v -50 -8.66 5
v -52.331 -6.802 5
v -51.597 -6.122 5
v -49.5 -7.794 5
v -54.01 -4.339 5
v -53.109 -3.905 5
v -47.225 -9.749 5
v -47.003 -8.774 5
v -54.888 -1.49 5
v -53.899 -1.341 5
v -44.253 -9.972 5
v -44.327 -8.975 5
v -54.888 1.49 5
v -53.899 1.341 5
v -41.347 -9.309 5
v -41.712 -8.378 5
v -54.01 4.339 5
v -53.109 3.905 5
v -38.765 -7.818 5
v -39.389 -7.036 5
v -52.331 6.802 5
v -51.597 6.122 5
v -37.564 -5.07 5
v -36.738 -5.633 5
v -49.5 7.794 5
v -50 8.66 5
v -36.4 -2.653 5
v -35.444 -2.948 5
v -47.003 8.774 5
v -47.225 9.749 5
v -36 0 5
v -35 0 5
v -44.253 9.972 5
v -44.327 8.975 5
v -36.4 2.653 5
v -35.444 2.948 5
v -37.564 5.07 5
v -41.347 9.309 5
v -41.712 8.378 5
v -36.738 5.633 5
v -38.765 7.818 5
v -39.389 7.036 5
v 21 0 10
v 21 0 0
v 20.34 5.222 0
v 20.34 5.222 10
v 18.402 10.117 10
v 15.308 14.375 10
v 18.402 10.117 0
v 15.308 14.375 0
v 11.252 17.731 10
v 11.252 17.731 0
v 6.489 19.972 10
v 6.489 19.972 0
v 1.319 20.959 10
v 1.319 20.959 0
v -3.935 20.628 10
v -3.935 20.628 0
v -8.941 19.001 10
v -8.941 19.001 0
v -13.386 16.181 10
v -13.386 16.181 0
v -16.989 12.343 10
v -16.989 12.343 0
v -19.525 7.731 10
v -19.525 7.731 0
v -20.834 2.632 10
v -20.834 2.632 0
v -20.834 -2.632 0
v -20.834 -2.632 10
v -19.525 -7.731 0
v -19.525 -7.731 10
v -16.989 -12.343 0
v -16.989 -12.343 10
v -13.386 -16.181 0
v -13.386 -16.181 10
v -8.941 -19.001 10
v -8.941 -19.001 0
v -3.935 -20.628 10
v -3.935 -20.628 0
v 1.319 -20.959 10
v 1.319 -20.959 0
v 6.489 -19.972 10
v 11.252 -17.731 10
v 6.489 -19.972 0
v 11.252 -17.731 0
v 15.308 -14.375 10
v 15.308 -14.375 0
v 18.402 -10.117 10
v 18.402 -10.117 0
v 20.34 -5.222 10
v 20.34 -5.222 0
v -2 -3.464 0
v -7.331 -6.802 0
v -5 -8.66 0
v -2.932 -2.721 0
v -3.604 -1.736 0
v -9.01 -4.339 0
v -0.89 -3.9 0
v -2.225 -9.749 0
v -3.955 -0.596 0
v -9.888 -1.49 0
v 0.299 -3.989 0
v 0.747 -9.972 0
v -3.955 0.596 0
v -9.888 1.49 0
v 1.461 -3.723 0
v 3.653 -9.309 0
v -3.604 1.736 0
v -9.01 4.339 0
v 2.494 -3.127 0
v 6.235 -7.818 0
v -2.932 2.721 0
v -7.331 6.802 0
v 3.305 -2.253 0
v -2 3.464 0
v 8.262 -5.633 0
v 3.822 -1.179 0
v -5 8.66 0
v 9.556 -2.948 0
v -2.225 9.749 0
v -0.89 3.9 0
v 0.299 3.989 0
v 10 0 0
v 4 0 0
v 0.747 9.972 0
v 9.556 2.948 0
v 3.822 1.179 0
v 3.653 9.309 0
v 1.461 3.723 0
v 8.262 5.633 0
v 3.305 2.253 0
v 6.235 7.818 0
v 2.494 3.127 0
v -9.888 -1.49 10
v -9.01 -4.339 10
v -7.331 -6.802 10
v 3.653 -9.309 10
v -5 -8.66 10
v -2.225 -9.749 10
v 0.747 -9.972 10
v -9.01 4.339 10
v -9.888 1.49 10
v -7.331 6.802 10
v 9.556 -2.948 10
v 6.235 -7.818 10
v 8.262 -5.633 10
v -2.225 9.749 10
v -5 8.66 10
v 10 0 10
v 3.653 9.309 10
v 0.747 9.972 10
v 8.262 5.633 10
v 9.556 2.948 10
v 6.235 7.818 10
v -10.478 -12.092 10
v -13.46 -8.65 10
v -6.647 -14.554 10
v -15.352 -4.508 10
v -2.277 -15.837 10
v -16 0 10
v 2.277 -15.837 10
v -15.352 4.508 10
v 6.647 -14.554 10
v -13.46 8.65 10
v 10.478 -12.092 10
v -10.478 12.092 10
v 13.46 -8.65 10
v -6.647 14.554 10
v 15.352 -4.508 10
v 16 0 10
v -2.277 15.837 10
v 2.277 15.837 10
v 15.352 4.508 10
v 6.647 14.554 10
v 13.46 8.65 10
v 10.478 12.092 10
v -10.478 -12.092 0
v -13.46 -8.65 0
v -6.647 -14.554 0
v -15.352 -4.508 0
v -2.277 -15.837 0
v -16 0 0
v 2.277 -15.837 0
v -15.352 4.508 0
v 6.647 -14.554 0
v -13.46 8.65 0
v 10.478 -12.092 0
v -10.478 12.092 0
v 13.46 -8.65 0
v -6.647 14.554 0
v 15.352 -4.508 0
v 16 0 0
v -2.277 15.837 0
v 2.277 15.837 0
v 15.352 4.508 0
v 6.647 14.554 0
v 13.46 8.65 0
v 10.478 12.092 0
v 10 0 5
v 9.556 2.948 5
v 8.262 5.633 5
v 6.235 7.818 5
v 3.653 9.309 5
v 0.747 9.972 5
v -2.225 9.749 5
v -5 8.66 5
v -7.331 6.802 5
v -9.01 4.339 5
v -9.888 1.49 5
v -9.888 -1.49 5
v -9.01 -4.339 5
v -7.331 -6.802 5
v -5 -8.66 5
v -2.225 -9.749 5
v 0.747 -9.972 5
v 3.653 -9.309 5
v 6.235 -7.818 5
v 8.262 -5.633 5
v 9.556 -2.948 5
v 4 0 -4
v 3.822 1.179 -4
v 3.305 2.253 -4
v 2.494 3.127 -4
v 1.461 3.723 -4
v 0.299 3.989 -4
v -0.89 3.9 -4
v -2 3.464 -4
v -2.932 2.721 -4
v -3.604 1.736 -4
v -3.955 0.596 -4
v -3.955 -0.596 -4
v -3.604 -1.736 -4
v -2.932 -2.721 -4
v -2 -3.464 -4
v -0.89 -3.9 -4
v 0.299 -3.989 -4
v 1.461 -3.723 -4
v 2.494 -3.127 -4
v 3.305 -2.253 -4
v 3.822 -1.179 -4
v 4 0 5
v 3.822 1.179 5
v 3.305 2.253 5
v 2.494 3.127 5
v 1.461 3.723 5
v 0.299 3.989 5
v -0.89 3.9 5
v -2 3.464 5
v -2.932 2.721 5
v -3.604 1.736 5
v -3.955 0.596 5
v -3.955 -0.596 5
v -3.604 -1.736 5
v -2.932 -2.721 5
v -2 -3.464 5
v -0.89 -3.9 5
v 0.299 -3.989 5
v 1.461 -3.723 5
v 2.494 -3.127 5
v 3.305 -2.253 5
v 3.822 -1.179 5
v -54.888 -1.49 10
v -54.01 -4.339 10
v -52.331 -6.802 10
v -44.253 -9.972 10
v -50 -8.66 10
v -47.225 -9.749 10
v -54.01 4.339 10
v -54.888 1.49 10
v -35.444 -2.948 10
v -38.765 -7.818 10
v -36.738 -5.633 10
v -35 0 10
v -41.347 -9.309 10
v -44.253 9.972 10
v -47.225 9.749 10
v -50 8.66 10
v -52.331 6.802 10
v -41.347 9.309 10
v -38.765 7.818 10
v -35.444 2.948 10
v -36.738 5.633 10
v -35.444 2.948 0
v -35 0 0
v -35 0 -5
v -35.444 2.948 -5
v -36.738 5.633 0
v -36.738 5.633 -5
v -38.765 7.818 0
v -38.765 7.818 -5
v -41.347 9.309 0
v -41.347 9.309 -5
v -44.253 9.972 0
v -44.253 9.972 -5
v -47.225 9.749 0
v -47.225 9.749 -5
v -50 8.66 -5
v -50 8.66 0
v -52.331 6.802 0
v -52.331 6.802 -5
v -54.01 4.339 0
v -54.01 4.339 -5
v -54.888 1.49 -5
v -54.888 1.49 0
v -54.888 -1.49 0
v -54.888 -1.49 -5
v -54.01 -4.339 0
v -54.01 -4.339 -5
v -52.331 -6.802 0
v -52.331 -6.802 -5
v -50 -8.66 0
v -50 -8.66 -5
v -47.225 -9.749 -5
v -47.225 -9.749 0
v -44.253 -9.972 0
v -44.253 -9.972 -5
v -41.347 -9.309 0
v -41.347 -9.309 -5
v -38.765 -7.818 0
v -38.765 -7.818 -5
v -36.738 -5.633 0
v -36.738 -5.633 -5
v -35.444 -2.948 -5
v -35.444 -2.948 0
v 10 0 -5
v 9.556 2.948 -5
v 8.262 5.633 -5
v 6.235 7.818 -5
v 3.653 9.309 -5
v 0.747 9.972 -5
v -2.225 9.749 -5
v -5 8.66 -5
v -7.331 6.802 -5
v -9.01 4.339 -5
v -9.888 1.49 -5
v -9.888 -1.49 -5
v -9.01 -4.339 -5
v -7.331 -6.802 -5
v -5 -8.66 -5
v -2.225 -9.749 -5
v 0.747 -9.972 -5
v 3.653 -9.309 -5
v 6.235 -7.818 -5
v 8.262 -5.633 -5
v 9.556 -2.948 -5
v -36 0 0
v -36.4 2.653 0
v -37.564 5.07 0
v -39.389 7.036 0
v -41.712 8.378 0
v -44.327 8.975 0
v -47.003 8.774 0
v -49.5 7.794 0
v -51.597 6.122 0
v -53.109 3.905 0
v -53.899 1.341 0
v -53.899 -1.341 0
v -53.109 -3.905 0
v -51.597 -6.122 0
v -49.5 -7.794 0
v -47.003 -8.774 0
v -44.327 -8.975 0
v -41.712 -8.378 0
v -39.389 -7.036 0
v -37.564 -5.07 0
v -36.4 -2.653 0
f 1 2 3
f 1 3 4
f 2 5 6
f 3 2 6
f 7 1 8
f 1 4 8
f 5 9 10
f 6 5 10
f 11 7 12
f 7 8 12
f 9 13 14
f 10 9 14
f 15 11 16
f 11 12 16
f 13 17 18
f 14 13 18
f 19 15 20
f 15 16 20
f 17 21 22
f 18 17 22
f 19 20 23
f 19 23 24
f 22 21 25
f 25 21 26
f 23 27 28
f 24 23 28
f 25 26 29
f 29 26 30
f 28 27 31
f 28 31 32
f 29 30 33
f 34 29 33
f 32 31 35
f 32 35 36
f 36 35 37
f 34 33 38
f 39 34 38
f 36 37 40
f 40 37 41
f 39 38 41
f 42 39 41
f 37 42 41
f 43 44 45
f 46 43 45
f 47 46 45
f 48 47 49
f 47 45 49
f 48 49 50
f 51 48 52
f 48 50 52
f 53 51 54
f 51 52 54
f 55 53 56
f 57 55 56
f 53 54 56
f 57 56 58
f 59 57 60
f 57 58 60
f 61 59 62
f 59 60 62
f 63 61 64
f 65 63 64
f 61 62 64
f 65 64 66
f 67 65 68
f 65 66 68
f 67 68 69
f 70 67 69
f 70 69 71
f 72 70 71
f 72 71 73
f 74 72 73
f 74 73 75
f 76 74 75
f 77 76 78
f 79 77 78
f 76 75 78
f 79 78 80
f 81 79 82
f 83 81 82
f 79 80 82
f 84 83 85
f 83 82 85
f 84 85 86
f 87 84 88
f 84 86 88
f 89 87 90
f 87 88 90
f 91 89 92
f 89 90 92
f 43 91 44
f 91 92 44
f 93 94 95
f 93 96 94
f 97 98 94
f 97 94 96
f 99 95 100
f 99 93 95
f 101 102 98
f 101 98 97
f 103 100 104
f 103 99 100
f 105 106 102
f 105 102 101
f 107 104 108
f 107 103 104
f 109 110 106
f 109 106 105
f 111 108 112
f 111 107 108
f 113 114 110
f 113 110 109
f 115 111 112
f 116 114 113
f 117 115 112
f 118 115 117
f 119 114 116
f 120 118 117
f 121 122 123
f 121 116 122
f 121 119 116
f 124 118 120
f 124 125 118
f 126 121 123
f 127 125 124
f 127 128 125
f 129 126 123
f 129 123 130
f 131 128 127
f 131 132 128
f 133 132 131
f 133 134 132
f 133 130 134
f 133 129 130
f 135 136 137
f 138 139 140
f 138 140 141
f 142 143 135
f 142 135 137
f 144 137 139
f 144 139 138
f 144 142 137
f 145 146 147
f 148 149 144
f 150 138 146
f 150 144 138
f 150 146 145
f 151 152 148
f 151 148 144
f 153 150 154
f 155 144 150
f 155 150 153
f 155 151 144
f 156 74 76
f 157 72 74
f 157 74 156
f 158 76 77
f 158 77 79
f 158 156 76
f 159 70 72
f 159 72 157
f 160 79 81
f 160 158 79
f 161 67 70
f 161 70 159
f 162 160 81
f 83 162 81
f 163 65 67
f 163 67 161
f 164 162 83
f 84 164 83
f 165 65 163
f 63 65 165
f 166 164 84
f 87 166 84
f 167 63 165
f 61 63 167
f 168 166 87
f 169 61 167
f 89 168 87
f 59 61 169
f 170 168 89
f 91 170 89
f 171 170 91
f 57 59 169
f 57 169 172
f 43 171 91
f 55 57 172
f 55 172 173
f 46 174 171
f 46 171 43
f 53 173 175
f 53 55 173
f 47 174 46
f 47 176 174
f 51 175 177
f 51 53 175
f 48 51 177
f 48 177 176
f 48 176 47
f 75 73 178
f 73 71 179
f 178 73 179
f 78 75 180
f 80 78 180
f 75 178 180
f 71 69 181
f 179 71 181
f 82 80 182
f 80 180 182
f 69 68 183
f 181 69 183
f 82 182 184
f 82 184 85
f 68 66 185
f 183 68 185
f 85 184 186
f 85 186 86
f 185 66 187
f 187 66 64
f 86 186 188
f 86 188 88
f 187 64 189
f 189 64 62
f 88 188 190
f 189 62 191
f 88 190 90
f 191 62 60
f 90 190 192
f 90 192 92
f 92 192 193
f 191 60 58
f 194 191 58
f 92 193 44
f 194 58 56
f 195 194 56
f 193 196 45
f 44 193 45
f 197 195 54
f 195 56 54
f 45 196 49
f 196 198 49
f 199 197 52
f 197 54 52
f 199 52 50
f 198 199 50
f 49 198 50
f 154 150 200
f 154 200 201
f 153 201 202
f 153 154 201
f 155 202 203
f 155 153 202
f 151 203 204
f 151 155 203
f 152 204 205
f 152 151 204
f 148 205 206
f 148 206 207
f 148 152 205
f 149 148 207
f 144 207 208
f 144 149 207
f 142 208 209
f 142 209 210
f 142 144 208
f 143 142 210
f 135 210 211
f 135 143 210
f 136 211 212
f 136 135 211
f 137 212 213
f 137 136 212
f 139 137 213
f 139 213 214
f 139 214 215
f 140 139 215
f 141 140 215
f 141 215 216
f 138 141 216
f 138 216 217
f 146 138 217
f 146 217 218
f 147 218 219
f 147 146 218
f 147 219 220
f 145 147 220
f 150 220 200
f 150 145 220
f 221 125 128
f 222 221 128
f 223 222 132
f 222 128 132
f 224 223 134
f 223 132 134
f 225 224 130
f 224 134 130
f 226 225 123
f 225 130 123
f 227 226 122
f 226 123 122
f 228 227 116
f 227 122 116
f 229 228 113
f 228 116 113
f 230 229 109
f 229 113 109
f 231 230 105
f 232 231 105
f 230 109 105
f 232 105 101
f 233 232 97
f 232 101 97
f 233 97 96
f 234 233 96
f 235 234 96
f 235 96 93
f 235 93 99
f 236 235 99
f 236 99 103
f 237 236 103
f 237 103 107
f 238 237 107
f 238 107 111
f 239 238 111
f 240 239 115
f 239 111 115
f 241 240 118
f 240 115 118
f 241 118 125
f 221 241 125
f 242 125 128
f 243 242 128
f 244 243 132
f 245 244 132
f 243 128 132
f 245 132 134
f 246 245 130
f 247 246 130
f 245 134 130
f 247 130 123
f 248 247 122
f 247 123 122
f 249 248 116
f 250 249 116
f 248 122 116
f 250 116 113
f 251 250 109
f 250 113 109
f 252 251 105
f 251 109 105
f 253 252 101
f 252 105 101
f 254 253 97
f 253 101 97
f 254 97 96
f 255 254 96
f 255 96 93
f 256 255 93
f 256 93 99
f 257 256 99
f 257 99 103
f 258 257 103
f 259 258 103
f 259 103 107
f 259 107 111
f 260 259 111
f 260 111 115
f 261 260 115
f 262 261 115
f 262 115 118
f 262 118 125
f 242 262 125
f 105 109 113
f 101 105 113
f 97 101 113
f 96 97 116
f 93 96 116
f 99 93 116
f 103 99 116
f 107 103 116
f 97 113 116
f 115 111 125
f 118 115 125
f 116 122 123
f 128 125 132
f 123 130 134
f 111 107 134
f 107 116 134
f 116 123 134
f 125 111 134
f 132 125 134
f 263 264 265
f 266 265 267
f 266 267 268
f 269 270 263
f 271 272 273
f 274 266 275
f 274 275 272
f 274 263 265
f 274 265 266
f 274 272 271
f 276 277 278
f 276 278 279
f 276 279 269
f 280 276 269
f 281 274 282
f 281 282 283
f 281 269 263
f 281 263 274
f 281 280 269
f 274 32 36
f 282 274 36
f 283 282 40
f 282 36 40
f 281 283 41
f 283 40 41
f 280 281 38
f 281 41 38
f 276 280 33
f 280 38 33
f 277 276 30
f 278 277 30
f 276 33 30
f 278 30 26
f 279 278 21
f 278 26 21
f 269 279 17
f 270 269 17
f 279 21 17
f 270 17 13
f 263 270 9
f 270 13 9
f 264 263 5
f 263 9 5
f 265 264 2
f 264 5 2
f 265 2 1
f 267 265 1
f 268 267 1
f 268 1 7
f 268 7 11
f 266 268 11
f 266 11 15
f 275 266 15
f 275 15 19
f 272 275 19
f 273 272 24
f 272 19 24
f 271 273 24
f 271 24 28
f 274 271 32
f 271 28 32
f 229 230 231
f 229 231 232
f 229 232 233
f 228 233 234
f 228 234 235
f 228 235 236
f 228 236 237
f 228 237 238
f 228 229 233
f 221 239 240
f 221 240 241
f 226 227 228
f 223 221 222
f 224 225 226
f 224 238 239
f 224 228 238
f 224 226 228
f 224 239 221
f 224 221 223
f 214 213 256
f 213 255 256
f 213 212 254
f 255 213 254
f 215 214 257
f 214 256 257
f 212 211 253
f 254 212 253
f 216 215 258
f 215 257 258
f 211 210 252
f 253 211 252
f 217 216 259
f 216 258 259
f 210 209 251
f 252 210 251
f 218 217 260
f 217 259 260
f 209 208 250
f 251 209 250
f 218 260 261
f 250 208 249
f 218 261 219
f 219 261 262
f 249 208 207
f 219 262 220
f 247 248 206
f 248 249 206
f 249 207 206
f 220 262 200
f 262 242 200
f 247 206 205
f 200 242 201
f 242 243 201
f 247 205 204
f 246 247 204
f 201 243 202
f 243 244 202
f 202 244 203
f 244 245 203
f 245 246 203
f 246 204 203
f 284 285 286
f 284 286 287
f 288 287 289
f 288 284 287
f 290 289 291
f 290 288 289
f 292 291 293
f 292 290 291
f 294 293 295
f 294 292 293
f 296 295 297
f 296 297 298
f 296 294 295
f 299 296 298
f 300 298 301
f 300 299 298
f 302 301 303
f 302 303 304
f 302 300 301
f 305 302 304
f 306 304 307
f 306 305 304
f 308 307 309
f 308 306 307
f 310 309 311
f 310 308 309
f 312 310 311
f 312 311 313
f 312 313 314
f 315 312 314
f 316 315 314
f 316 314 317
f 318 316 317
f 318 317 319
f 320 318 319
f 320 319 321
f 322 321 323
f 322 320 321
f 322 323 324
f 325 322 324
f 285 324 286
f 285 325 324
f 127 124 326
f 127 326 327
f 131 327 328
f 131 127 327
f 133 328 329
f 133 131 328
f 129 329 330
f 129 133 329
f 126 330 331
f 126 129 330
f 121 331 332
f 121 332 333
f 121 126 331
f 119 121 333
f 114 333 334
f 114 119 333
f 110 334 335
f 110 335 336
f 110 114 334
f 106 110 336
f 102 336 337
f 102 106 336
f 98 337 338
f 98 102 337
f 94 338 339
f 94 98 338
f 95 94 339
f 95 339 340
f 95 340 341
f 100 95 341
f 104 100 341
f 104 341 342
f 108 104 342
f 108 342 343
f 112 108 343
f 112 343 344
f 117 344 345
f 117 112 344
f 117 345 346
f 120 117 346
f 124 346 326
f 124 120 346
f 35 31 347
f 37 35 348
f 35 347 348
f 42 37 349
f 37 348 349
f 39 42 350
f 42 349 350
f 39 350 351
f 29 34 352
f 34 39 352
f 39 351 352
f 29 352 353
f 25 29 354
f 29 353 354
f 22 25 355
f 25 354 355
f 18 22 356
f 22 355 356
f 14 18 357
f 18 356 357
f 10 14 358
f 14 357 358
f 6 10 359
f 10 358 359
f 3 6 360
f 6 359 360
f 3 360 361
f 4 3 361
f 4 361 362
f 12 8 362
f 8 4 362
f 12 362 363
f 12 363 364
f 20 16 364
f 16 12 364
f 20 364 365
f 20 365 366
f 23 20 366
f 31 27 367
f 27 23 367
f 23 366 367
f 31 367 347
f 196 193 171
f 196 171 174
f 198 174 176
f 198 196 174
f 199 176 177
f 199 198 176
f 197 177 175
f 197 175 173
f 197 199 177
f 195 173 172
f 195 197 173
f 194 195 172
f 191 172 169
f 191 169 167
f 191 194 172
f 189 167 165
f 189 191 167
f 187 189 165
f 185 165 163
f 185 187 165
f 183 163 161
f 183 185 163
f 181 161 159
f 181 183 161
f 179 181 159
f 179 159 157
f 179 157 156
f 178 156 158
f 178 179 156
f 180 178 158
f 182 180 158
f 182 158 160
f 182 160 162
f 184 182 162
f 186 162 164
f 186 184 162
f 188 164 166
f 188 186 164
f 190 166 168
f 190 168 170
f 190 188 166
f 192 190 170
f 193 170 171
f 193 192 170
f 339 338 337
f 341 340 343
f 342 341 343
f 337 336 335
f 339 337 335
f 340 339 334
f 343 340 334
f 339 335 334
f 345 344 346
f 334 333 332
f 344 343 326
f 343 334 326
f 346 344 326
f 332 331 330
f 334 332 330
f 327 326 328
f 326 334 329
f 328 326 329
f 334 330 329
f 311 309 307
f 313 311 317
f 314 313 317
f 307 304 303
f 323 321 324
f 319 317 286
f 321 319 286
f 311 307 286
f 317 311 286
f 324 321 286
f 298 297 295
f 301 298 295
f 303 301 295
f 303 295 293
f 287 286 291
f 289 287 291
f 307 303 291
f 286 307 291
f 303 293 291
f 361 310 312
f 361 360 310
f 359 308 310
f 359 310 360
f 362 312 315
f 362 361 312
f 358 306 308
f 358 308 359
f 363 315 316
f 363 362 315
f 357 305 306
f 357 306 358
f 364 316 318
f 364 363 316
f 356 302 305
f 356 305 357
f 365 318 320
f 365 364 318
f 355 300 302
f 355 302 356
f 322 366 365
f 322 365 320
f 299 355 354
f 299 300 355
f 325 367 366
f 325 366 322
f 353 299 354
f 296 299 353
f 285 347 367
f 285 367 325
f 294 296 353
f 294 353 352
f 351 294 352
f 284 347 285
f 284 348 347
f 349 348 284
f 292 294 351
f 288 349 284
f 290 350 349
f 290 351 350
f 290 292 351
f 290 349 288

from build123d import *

# Parameters (mm, degrees)
F0_R      = 10
F0_R_2    = 4
F1_DEPTH  = 5
F2_DEPTH  = 10
F3_R      = 10
F3_R_2    = 4
F4_DEPTH  = 5
F5_DEPTH  = 4
F0_R_3    = 21
F0_R_4    = 16
F6_DEPTH  = 10
F0_R_5    = 9
F7_DEPTH  = 5
F9_DEPTH  = 10
F10_R     = 10
F11_DEPTH = 5


with BuildPart() as f1:
    # F0 (on Top) → F1 (new body)
    with BuildSketch(Plane.XY):
        Circle(F0_R)
        Circle(F0_R_2, mode=Mode.SUBTRACT)
        Circle(F0_R_2)
    extrude(amount=-F1_DEPTH)

    # F0 (on Top) → F5 (cut)
    with BuildSketch(Plane.XY):
        Circle(F0_R_2)
    extrude(amount=-F5_DEPTH, mode=Mode.SUBTRACT)


with BuildPart() as f2:
    # F0 (on Top) → F2 (new body)
    with BuildSketch(Plane.XY):
        Circle(F0_R_2)
    extrude(amount=F2_DEPTH)

    # F3 (on face) → F4 (join)
    with BuildSketch(Plane.XY.offset(10)):
        Circle(F3_R)
        Circle(F3_R_2, mode=Mode.SUBTRACT)
    extrude(amount=-F4_DEPTH)


with BuildPart() as f6:
    # F0 (on Top) → F6 (new body)
    with BuildSketch(Plane.XY):
        Circle(F0_R_3)
        Circle(F0_R_4, mode=Mode.SUBTRACT)
    extrude(amount=F6_DEPTH)


with BuildPart() as f7:
    # F0 (on Top) → F7 (new body)
    with BuildSketch(Plane.XY):
        with Locations((-45, 0)):
            Circle(F0_R)
        with Locations((-45, 0)):
            Circle(F0_R_5, mode=Mode.SUBTRACT)
        with Locations((-45, 0)):
            Circle(F0_R_5)
    extrude(amount=-F7_DEPTH)

    # F0 (on Top) → F9 (join)
    with BuildSketch(Plane.XY):
        with Locations((-45, 0)):
            Circle(F0_R_5)
    extrude(amount=F9_DEPTH)

    # F10 (on offset) → F11 (join)
    with BuildSketch(Plane.XY.offset(5)):
        with Locations((-45, 0)):
            Circle(F10_R)
    extrude(amount=F11_DEPTH)


solid = Compound([f1.part, f2.part, f6.part, f7.part])
